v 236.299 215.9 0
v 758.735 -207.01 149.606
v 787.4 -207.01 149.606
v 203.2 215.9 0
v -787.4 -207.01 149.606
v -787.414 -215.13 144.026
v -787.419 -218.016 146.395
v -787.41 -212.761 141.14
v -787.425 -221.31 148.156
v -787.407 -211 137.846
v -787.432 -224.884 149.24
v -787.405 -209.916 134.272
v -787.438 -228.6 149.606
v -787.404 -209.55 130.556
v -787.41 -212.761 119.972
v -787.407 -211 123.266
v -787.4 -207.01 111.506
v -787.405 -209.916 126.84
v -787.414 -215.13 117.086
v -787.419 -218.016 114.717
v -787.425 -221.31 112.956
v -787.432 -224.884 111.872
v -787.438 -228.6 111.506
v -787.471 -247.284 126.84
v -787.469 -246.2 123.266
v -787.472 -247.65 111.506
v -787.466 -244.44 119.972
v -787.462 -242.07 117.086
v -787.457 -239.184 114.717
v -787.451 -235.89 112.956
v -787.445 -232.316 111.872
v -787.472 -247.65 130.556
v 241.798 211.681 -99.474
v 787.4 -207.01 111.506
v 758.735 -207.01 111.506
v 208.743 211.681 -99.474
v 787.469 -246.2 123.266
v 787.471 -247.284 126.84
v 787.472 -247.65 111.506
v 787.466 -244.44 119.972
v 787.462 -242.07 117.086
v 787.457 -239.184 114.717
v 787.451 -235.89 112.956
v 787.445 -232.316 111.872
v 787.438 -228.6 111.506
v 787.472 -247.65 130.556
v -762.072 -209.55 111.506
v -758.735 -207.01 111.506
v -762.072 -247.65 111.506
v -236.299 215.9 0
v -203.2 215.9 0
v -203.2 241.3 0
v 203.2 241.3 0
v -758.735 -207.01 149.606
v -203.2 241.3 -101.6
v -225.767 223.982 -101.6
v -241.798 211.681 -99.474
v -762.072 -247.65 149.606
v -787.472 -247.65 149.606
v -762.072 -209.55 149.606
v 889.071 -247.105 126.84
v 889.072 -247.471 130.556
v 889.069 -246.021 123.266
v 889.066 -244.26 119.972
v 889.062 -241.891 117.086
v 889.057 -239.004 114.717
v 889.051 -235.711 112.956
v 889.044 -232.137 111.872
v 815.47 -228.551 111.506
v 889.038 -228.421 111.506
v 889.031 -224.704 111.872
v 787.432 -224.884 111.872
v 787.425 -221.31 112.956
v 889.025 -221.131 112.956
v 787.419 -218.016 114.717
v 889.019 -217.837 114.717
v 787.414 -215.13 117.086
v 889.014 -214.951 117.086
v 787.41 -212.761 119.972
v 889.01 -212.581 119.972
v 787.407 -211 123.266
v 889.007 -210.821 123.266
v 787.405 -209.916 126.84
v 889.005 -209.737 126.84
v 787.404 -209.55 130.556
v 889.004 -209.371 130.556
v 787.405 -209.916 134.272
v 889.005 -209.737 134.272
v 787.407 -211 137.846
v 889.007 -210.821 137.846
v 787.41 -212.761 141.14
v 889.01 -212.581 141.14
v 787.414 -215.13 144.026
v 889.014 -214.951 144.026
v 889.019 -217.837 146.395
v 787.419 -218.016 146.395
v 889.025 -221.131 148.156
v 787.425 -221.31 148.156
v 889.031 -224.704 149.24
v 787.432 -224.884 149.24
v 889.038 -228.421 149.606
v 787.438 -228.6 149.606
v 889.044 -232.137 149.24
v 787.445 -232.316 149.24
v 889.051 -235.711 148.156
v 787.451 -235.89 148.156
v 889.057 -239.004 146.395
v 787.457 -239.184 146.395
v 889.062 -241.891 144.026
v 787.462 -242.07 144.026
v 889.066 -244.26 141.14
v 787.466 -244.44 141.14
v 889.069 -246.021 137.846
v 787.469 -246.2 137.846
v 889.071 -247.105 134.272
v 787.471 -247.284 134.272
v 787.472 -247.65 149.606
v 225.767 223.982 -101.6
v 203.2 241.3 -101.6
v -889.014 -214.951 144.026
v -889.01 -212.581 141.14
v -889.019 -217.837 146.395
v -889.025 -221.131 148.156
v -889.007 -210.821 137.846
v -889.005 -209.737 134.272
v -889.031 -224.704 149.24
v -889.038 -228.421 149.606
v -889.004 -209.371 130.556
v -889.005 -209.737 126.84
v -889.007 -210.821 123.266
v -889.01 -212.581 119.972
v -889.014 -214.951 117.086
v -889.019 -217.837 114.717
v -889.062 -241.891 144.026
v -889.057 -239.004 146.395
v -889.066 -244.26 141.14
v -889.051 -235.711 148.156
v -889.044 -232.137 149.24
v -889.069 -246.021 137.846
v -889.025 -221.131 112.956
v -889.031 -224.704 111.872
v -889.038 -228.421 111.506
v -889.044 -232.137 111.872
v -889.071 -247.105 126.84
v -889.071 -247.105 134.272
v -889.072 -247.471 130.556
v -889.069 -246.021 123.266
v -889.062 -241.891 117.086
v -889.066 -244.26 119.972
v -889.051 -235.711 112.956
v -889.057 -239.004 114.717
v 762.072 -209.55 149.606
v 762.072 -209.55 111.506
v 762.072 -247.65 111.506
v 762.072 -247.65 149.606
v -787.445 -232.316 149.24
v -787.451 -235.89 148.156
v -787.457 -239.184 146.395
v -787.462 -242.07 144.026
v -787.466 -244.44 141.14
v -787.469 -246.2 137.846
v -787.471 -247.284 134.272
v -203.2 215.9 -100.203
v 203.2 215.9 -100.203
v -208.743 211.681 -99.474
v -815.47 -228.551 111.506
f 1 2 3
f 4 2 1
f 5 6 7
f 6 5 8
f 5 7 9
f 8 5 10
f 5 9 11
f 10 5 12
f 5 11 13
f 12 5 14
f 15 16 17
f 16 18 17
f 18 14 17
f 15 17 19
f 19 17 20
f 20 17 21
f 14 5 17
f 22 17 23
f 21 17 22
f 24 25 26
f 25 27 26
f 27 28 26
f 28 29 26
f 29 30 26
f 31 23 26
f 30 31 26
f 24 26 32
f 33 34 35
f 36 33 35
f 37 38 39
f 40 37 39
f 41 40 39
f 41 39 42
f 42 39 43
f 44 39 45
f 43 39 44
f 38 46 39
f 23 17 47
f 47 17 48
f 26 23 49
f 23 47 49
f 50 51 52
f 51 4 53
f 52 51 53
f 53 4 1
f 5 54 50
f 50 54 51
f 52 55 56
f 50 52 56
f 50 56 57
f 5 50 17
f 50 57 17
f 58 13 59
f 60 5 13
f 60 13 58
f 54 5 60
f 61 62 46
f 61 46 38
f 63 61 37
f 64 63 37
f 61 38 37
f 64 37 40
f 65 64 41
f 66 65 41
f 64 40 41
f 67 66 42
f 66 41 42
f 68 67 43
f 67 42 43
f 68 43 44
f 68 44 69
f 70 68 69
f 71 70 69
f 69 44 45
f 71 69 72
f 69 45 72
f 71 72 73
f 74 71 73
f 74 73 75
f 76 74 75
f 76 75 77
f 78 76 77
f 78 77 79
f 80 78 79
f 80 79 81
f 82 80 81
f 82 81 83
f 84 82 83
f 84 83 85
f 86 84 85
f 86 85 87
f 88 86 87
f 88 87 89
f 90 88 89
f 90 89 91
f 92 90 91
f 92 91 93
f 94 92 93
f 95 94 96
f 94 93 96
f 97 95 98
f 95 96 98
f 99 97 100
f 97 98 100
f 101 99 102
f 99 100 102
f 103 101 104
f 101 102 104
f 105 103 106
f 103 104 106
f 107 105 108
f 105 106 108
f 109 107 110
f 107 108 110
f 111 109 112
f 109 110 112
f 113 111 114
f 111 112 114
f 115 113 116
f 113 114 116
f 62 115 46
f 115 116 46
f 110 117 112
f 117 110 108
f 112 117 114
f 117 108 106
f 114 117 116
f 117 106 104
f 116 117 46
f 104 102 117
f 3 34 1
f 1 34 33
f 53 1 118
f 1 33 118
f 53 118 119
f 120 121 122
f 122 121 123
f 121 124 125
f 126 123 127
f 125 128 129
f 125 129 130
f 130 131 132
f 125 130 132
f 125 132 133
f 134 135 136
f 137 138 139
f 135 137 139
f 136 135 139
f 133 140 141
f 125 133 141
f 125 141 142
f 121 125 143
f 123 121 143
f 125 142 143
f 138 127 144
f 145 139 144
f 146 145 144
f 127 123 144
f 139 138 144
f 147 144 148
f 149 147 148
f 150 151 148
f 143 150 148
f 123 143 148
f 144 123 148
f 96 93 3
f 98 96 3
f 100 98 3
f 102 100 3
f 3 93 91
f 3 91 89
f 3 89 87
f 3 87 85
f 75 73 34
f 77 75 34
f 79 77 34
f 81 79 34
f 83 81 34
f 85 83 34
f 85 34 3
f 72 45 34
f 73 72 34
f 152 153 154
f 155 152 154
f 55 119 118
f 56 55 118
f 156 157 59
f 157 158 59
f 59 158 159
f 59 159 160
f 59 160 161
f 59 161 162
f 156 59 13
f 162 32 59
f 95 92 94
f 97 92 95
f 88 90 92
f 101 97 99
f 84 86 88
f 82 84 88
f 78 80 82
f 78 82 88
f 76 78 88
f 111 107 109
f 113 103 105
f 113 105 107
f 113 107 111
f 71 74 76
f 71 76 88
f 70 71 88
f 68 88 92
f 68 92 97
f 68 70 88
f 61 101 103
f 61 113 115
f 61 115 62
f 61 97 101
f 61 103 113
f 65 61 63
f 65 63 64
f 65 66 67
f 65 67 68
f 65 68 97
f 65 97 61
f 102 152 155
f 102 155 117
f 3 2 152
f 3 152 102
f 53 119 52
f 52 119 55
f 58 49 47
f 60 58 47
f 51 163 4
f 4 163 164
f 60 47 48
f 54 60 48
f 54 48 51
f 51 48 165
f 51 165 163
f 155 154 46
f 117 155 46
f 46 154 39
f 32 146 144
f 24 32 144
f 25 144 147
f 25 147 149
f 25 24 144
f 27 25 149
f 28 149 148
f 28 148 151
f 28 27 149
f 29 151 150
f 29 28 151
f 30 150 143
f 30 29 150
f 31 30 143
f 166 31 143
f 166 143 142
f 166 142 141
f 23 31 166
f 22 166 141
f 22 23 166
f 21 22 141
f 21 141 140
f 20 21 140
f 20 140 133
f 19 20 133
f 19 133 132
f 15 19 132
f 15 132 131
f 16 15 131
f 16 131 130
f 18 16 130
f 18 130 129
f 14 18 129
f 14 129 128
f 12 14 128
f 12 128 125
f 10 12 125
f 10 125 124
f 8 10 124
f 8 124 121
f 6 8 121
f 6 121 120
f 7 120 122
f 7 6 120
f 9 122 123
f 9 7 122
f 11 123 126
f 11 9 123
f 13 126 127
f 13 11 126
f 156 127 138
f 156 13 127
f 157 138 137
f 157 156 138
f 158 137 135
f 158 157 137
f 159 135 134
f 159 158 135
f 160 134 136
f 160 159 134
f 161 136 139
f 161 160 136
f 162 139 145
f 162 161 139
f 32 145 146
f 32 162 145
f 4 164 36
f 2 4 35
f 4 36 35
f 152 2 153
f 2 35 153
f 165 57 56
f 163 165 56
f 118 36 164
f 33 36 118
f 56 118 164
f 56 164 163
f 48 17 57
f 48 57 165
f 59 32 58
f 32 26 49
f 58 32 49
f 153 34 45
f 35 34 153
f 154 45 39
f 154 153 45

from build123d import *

# Parameters (mm, degrees)
BOSS_EXTRUDE1_DEPTH            = 11.43
BOSS_EXTRUDE1_DEPTH_BACK       = 101.6
CUT_EXTRUDE2_REACH             = 833.724
CUT_EXTRUDE2_DIRECTION_2_REACH = 833.724
CUT_EXTRUDE3_REACH             = 833.724
CUT_EXTRUDE3_DIRECTION_2_REACH = 833.724
BOSS_EXTRUDE3_DEPTH            = 149.606
SKETCH9_R                      = 19.05
BOSS_EXTRUDE4_DEPTH            = 101.6
CUT_EXTRUDE4_REACH             = 936.966
CUT_EXTRUDE4_DIRECTION_2_REACH = 936.966
CUT_EXTRUDE5_REACH             = 936.966
CUT_EXTRUDE5_DIRECTION_2_REACH = 936.966


with BuildPart() as part:
    # Sketch1 → Boss-Extrude1 (new, two sides: drawn at the far end of the back side and taken through both)
    with BuildSketch(Plane.XY.offset(-BOSS_EXTRUDE1_DEPTH_BACK)):
        Polygon((-787.4, -209.55), (-787.471663752, -247.65), (-762.071663752, -247.65), (-762.071663752, -209.55), (-203.2, 215.9), (0, 215.9), (0, 241.3), (-203.2, 241.3), (-787.4, -207.01), align=None)
        Polygon((0, 241.3), (0, 215.9), (203.2, 215.9), (762.071663752, -209.55), (762.071663752, -247.65), (787.471663752, -247.65), (787.4, -209.55), (787.4, -207.01), (203.2, 241.3), align=None)
    extrude(amount=BOSS_EXTRUDE1_DEPTH + BOSS_EXTRUDE1_DEPTH_BACK)

    # Sketch5 → Cut-Extrude2 (cut, up to next)
    with BuildSketch(Plane(origin=(0, 0, 0), x_dir=(0, 0, -1), z_dir=(1, 0, 0)), mode=Mode.PRIVATE) as cut_extrude2_sk1:
        Polygon((-11.43, -209.55), (0, 215.9), (0, 241.3), (-11.43, 241.3), (-11.43, 215.9), align=None)
    cut_extrude2_tool1 = extrude(cut_extrude2_sk1.sketch, amount=-CUT_EXTRUDE2_REACH, mode=Mode.PRIVATE) & part.part
    add(cut_extrude2_tool1.solids().sort_by_distance((0, 90.565111, 7.4168))[0], mode=Mode.SUBTRACT)

    # Sketch5 → Cut-Extrude2 direction 2 (cut, up to next)
    with BuildSketch(Plane(origin=(0, 0, 0), x_dir=(0, 0, -1), z_dir=(1, 0, 0)), mode=Mode.PRIVATE) as cut_extrude2_direction_2_sk1:
        Polygon((-11.43, -209.55), (0, 215.9), (0, 241.3), (-11.43, 241.3), (-11.43, 215.9), align=None)
    cut_extrude2_direction_2_tool1 = extrude(cut_extrude2_direction_2_sk1.sketch, amount=CUT_EXTRUDE2_DIRECTION_2_REACH, mode=Mode.PRIVATE) & part.part
    add(cut_extrude2_direction_2_tool1.solids().sort_by_distance((0, 90.565111, 7.4168))[0], mode=Mode.SUBTRACT)

    # Sketch7 → Cut-Extrude3 (cut, up to next)
    with BuildSketch(Plane(origin=(0, 0, 0), x_dir=(0, 0, -1), z_dir=(1, 0, 0)), mode=Mode.PRIVATE) as cut_extrude3_sk1:
        Polygon((26.67, -209.55), (101.6, 223.982414479), (101.6, -247.65), (26.67, -247.65), align=None)
    cut_extrude3_tool1 = extrude(cut_extrude3_sk1.sketch, amount=-CUT_EXTRUDE3_REACH, mode=Mode.PRIVATE) & part.part
    add(cut_extrude3_tool1.solids().sort_by_distance((0, -89.489932, -74.75645))[0], mode=Mode.SUBTRACT)

    # Sketch7 → Cut-Extrude3 direction 2 (cut, up to next)
    with BuildSketch(Plane(origin=(0, 0, 0), x_dir=(0, 0, -1), z_dir=(1, 0, 0)), mode=Mode.PRIVATE) as cut_extrude3_direction_2_sk1:
        Polygon((26.67, -209.55), (101.6, 223.982414479), (101.6, -247.65), (26.67, -247.65), align=None)
    cut_extrude3_direction_2_tool1 = extrude(cut_extrude3_direction_2_sk1.sketch, amount=CUT_EXTRUDE3_DIRECTION_2_REACH, mode=Mode.PRIVATE) & part.part
    add(cut_extrude3_direction_2_tool1.solids().sort_by_distance((0, -89.489932, -74.75645))[0], mode=Mode.SUBTRACT)

    # Sketch8 → Boss-Extrude3 (add)
    with BuildSketch(Plane.XY):
        Polygon((-787.471663752, -247.65), (-762.071663752, -247.65), (-762.071663752, -209.55), (-203.2, 215.9), (203.2, 215.9), (762.071663752, -209.55), (762.071663752, -247.65), (787.471663752, -247.65), (787.4, -207.01), (203.2, 241.3), (-203.2, 241.3), (-787.4, -207.01), align=None)
    extrude(amount=BOSS_EXTRUDE3_DEPTH)

    # Sketch9 → Boss-Extrude4 (add)
    with BuildSketch(Plane(origin=(787.032515479, 1.387837182, 0), x_dir=(0, 0, -1), z_dir=(0.9999984452495948, 0.0017633769855495952, 0))):
        with Locations(Location((-130.556, -229.988224375, 0), (0, 0, 270))):
            Circle(SKETCH9_R)
    boss_extrude4 = extrude(amount=BOSS_EXTRUDE4_DEPTH)

    # Mirror1: Boss-Extrude4 across plane
    add(boss_extrude4.mirror(Plane(origin=(0, 0, 0), x_dir=(0, 0, 1), z_dir=(1, 0, 0))))

    # Cut-Extrude4: up to this face of the body (flat: up to its plane)
    cut_extrude4_end = Plane(part.part.faces().sort_by_distance((-477.863853052, 30.525347549, 40.754880745))[0])
    # Sketch10 → Cut-Extrude4 (cut, up to the picked face)
    with BuildSketch(Plane(origin=(0, 0, 0), x_dir=(0, 0, -1), z_dir=(1, 0, 0)), mode=Mode.PRIVATE) as cut_extrude4_sk1:
        Polygon((-111.506, -207.01), (-111.506, -247.65), (101.6, -247.65), (101.6, 215.9), align=None)
    cut_extrude4_tool1 = split(extrude(cut_extrude4_sk1.sketch, amount=-CUT_EXTRUDE4_REACH, mode=Mode.PRIVATE), bisect_by=cut_extrude4_end, keep=Keep.BOTH, mode=Mode.PRIVATE)
    add(cut_extrude4_tool1.solids().sort_by(Axis((0, -92.041411, -24.838897), (-1, 0, 0)))[0], mode=Mode.SUBTRACT)

    # Cut-Extrude4 direction 2: up to this face of the body (flat: up to its plane)
    cut_extrude4_direction_2_end = Plane(part.part.faces().sort_by_distance((477.863853052, 30.525347549, 40.754880745))[0])
    # Sketch10 → Cut-Extrude4 direction 2 (cut, up to the picked face)
    with BuildSketch(Plane(origin=(0, 0, 0), x_dir=(0, 0, -1), z_dir=(1, 0, 0)), mode=Mode.PRIVATE) as cut_extrude4_direction_2_sk1:
        Polygon((-111.506, -207.01), (-111.506, -247.65), (101.6, -247.65), (101.6, 215.9), align=None)
    cut_extrude4_direction_2_tool1 = split(extrude(cut_extrude4_direction_2_sk1.sketch, amount=CUT_EXTRUDE4_DIRECTION_2_REACH, mode=Mode.PRIVATE), bisect_by=cut_extrude4_direction_2_end, keep=Keep.BOTH, mode=Mode.PRIVATE)
    add(cut_extrude4_direction_2_tool1.solids().sort_by(Axis((0, -92.041411, -24.838897), (1, 0, 0)))[0], mode=Mode.SUBTRACT)

    # Cut-Extrude5: up to this plane
    cut_extrude5_end = Plane(origin=(-191.85340904, 250.007275237, 11.43), z_dir=(-0.6087935435147127, 0.7933286969313537, 0))
    # Sketch11 → Cut-Extrude5 (cut, up to the surface)
    with BuildSketch(Plane(origin=(0, 0, 0), x_dir=(0, 0, -1), z_dir=(1, 0, 0)), mode=Mode.PRIVATE) as cut_extrude5_sk1:
        Polygon((0, 241.3), (-149.606, 241.3), (-149.606, -207.01), (0, 215.9), align=None)
    cut_extrude5_tool1 = split(extrude(cut_extrude5_sk1.sketch, amount=-CUT_EXTRUDE5_REACH, mode=Mode.PRIVATE), bisect_by=cut_extrude5_end, keep=Keep.BOTH, mode=Mode.PRIVATE)
    add(cut_extrude5_tool1.solids().sort_by_distance((0, 91.409357, 97.06341))[0], mode=Mode.SUBTRACT)

    # Cut-Extrude5 direction 2: up to this plane
    cut_extrude5_direction_2_end = Plane(origin=(191.85340904, 250.007275237, 11.43), z_dir=(-0.608793543514713, -0.7933286969313534, 0))
    # Sketch11 → Cut-Extrude5 direction 2 (cut, up to the surface)
    with BuildSketch(Plane(origin=(0, 0, 0), x_dir=(0, 0, -1), z_dir=(1, 0, 0)), mode=Mode.PRIVATE) as cut_extrude5_direction_2_sk1:
        Polygon((0, 241.3), (-149.606, 241.3), (-149.606, -207.01), (0, 215.9), align=None)
    cut_extrude5_direction_2_tool1 = split(extrude(cut_extrude5_direction_2_sk1.sketch, amount=CUT_EXTRUDE5_DIRECTION_2_REACH, mode=Mode.PRIVATE), bisect_by=cut_extrude5_direction_2_end, keep=Keep.BOTH, mode=Mode.PRIVATE)
    add(cut_extrude5_direction_2_tool1.solids().sort_by_distance((0, 91.409357, 97.06341))[0], mode=Mode.SUBTRACT)


solid = part.part
